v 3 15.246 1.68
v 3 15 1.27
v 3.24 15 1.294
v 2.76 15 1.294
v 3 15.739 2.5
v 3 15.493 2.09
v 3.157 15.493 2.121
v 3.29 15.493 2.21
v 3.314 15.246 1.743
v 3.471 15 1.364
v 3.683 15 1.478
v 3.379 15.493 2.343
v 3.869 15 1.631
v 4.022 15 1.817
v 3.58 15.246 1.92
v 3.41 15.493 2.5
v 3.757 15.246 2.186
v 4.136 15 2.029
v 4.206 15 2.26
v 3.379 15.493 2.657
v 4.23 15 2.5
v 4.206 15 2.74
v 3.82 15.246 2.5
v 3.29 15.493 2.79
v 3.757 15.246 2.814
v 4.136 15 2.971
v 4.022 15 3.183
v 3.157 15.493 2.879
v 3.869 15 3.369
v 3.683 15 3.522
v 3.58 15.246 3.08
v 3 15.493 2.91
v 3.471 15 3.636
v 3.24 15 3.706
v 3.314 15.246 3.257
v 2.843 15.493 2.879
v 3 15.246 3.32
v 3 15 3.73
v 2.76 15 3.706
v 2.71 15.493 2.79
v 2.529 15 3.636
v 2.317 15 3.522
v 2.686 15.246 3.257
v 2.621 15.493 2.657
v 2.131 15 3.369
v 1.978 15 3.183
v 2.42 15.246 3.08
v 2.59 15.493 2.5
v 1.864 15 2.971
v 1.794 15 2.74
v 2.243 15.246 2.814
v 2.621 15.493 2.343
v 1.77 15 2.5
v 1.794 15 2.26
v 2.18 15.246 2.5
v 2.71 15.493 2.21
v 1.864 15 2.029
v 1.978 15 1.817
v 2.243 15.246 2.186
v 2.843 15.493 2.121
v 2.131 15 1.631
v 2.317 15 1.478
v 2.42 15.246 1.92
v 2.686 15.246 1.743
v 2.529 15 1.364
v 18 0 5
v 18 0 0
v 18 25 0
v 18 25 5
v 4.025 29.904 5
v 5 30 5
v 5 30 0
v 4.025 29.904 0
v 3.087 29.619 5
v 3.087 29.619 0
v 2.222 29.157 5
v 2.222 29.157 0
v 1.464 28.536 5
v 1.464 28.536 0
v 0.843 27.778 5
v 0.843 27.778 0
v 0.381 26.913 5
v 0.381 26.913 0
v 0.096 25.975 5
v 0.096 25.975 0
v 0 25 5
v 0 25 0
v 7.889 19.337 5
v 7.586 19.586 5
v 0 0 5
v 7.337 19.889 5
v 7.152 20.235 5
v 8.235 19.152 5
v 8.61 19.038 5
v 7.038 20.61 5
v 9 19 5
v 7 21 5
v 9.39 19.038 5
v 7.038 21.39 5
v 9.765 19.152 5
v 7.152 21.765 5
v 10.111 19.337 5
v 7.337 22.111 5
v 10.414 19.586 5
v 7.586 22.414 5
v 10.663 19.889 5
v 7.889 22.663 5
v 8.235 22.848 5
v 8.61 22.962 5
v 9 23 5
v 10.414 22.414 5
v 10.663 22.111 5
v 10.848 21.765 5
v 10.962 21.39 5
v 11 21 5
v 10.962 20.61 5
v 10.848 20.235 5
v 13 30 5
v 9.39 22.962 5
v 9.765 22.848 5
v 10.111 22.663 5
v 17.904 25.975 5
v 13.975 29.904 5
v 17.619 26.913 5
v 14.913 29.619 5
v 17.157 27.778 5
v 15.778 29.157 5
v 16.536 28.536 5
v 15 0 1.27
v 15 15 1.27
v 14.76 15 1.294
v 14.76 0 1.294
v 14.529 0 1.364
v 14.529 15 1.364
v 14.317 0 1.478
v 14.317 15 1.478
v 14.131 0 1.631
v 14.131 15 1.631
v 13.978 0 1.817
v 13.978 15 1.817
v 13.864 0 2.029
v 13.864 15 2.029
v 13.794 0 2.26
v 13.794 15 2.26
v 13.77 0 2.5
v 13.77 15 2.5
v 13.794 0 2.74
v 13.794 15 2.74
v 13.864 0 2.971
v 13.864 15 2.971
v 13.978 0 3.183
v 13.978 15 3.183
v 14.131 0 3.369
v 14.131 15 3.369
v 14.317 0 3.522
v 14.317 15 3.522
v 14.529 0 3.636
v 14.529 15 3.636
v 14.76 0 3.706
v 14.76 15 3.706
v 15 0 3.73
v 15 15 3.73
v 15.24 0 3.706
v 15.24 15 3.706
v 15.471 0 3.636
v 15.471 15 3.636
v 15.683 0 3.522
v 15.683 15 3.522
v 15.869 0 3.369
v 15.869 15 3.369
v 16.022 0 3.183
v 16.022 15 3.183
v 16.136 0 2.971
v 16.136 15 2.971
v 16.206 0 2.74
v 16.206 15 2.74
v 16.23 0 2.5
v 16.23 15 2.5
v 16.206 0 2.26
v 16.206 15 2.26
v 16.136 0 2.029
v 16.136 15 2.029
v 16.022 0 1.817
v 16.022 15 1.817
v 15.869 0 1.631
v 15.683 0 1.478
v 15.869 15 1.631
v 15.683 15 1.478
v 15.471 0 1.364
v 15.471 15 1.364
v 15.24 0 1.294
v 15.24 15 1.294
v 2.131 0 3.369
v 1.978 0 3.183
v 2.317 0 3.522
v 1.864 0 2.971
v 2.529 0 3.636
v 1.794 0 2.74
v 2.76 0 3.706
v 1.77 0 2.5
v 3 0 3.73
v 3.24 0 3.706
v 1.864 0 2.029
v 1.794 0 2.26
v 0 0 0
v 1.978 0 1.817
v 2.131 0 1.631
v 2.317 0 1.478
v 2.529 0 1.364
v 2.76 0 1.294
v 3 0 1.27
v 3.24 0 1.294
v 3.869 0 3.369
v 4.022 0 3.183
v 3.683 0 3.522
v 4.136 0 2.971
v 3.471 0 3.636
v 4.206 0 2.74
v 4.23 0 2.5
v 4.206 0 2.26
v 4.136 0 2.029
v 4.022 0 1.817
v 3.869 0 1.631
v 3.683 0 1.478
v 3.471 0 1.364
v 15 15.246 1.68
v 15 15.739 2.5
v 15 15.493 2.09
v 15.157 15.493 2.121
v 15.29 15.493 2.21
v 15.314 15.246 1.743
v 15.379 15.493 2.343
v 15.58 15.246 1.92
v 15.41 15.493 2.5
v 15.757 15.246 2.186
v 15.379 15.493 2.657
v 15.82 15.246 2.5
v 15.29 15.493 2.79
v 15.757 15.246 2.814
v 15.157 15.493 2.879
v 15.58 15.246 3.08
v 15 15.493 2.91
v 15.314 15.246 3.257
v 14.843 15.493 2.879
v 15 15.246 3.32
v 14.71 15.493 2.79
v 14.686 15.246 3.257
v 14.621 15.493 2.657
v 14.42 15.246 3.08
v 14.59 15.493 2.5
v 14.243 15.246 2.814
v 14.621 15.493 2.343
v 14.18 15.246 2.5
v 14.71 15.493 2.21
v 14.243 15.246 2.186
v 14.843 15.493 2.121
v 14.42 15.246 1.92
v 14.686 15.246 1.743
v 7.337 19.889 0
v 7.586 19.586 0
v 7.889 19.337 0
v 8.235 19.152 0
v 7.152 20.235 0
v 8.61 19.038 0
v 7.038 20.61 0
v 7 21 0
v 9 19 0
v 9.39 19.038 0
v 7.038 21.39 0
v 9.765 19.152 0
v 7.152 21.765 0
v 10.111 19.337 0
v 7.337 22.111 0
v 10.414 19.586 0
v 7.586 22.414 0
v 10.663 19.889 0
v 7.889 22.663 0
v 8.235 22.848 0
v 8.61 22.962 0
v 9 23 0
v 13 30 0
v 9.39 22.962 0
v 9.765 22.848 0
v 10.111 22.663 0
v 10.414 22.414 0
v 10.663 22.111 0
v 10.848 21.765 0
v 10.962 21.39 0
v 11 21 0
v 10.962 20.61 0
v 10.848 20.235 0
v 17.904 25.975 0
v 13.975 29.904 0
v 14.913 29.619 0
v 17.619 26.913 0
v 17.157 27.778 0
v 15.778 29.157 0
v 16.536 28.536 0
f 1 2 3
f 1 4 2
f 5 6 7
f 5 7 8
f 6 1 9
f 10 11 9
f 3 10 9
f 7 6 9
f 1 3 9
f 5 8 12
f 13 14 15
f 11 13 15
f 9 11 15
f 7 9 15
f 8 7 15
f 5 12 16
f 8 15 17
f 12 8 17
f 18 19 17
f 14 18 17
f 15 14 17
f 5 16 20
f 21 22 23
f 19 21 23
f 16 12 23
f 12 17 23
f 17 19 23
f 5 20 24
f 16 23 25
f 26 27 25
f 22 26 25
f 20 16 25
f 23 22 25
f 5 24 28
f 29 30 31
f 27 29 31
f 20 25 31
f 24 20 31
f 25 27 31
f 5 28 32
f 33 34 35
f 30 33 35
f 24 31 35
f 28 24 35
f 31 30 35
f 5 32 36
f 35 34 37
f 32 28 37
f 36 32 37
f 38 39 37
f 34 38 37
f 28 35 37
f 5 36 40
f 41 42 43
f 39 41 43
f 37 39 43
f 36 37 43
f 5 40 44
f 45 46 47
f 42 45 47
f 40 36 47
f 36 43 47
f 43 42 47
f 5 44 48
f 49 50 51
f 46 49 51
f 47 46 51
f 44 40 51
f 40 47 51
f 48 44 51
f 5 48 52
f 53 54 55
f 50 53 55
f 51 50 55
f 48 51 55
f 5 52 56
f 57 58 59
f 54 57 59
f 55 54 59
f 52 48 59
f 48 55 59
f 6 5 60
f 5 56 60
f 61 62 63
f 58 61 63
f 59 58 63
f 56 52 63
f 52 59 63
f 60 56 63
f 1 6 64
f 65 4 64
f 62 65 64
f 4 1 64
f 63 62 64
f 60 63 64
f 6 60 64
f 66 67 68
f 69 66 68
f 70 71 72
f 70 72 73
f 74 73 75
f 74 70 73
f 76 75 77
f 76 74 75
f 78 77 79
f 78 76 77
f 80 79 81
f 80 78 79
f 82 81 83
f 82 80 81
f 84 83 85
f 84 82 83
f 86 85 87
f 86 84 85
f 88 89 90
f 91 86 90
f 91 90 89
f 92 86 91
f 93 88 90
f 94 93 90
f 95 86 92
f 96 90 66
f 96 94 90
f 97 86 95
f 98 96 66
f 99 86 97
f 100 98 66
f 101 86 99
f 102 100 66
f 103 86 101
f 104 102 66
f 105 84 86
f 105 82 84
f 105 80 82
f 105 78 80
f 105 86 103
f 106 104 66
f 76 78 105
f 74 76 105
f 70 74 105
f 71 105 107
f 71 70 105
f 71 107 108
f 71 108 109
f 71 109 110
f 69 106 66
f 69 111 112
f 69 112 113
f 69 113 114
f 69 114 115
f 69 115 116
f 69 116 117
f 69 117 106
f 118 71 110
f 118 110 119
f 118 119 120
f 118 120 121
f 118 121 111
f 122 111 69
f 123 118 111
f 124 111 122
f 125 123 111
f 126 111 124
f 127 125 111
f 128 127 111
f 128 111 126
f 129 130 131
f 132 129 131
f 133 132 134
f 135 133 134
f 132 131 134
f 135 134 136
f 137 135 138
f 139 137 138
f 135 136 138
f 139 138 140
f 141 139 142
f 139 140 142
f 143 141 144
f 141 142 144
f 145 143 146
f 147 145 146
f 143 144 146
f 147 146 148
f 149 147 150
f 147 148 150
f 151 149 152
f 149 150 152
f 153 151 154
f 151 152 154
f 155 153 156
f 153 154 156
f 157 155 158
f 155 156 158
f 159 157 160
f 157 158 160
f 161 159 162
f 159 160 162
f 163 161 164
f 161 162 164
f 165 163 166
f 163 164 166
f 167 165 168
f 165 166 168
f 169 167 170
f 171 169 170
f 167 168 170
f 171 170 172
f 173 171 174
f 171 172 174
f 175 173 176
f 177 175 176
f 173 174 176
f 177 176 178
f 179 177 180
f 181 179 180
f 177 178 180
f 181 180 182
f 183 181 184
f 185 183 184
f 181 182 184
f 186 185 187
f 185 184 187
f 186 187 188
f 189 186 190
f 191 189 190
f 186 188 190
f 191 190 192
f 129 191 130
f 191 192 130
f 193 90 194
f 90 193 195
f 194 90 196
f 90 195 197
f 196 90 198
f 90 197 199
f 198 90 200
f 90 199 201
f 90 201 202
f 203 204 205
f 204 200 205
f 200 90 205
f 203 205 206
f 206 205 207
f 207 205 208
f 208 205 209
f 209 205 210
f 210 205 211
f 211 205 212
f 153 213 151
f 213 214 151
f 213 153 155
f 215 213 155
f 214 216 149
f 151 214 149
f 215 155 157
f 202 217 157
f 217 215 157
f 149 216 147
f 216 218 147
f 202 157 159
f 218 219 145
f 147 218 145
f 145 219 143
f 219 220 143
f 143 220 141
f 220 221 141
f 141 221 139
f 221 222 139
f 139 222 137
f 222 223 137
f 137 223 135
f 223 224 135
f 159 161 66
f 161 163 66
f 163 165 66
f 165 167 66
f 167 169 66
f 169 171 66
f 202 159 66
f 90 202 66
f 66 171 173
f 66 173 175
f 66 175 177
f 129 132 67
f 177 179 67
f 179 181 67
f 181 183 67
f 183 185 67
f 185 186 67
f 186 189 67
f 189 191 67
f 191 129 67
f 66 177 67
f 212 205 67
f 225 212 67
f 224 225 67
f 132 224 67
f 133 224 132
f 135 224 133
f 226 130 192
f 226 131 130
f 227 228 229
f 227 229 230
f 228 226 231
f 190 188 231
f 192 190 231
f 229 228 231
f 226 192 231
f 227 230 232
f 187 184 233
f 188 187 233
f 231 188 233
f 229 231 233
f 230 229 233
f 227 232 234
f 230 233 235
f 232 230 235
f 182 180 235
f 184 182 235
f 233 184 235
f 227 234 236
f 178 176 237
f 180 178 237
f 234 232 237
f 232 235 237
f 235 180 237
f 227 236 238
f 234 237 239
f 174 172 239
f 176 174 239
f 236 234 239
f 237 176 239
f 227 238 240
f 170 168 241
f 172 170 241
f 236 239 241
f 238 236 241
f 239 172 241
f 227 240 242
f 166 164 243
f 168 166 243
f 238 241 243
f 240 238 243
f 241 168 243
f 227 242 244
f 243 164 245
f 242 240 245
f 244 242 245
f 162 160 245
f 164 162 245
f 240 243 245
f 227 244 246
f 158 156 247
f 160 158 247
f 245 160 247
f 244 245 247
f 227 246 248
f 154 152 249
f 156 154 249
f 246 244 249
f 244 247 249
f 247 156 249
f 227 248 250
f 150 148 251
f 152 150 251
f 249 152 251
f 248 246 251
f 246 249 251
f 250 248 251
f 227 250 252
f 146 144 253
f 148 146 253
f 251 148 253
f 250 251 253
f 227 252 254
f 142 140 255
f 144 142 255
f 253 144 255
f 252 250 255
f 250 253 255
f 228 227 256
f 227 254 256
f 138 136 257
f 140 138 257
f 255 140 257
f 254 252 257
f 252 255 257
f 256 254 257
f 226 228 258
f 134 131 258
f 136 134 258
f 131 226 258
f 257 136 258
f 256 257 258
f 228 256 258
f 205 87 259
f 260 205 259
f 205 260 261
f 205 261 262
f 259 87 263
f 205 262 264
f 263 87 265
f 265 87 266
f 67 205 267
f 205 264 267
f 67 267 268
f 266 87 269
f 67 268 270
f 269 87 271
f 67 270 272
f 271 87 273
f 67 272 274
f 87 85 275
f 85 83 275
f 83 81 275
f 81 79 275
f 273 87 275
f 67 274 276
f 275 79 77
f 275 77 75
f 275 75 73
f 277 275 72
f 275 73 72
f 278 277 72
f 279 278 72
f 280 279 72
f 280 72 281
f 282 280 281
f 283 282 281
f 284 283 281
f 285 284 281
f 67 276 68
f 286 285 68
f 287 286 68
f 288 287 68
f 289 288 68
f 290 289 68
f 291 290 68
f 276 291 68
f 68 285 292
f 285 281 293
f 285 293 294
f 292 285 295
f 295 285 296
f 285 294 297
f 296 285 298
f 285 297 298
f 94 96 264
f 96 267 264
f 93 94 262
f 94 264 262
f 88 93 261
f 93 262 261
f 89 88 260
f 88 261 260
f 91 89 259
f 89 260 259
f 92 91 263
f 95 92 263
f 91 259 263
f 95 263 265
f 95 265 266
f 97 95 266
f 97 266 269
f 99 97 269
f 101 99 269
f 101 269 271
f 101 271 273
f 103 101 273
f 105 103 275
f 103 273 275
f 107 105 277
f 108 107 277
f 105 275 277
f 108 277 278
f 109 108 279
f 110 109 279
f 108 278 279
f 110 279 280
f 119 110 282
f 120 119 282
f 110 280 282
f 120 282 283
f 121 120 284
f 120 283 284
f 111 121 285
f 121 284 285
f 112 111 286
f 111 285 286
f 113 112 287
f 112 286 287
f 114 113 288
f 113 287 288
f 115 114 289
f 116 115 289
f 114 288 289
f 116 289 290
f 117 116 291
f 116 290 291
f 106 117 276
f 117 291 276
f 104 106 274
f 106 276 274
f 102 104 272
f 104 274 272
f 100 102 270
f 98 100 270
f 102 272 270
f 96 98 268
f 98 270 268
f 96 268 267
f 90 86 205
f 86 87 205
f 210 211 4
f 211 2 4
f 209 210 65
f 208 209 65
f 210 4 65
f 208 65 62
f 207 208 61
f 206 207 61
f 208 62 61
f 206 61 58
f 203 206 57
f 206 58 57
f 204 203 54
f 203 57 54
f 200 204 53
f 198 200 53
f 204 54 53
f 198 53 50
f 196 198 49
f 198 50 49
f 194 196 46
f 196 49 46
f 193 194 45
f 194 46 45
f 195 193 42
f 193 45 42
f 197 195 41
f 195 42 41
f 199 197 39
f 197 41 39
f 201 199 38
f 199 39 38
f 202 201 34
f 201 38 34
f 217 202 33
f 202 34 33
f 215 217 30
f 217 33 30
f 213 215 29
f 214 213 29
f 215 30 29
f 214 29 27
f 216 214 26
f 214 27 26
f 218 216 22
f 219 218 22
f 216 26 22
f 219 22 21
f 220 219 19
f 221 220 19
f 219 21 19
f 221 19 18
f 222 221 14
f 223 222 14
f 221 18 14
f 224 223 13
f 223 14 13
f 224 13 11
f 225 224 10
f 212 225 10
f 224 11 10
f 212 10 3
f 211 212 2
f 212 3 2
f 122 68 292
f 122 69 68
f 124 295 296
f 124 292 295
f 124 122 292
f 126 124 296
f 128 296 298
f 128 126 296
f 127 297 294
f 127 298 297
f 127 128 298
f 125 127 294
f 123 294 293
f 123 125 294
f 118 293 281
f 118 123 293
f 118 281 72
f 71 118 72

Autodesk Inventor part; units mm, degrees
ref_plane "YZ Plane" through (0, 0, 0) normal (1, 0, 0) x (0, 1, 0)
ref_plane "XZ Plane" through (0, 0, 0) normal (0, 1, 0) x (-1, 0, 0)
ref_plane "XY Plane" through (0, 0, 0) normal (0, 0, 1) x (1, 0, 0)
sketch "Sketch1" plane through (0, 0, 0) normal (0, 0, 1) x (1, 0, 0)
  line L0 (0, 0) -> (0, 5) projected
  line L1 (18, 0) -> (18, 5) projected
  line L2 (0, 0) -> (18, 0) projected
  line L3 (0, 0) -> (18, 0)
  line L4 (18, 0) -> (18, 30)
  line L5 (18, 30) -> (0, 30)
  line L6 (0, 30) -> (0, 0)
  dimension "d0" = 30
extrude "Extrusion1" add sketch "Sketch1" along normal blind 5
fillet "Fillet1" radius 5 2 edges at (0, 30, 2.5) (18, 30, 2.5)
sketch "Sketch3" plane through (0, 0, 5) normal (0, 0, 1) x (1, 0, 0)
  circle A0 centre (9, 21) radius 2
  line L0 (0, 25) -> (0, 0) projected
  line L1 (13, 30) -> (5, 30) projected
  dimension "d11" = 9
  dimension "d12" = 9
  dimension "d13" = 4
hole "Hole2" at (9, 21, 5) direction (0, 0, -1) diameter 4 depth 20 tip angle 118
sketch "Sketch4" plane through (0, 0, 0) normal (0, -1, 0) x (1, 0, 0)
  circle A0 centre (3, 2.5) radius 1.5
  circle A1 centre (15, 2.5) radius 1.5
  line L0 (0, 0) -> (18, 0) projected
  line L1 (0, 0) -> (0, 5) projected
  dimension "d21" = 12
  dimension "d22" = 2.5
  dimension "d23" = 2.5
  dimension "d24" = 3
  dimension "d25" = 3
  dimension "d26" = 3
hole "Hole3" at (3, 0, 2.5) at (15, 0, 2.5) direction (0, 1, 0) diameter 2.459 depth 15 tip angle 118 thread size "M3x0.5" class "6H" standard "ISO Metric profile"
equation "\"d14\" = d13"
properties part number "Z-Kettenhalter3"
